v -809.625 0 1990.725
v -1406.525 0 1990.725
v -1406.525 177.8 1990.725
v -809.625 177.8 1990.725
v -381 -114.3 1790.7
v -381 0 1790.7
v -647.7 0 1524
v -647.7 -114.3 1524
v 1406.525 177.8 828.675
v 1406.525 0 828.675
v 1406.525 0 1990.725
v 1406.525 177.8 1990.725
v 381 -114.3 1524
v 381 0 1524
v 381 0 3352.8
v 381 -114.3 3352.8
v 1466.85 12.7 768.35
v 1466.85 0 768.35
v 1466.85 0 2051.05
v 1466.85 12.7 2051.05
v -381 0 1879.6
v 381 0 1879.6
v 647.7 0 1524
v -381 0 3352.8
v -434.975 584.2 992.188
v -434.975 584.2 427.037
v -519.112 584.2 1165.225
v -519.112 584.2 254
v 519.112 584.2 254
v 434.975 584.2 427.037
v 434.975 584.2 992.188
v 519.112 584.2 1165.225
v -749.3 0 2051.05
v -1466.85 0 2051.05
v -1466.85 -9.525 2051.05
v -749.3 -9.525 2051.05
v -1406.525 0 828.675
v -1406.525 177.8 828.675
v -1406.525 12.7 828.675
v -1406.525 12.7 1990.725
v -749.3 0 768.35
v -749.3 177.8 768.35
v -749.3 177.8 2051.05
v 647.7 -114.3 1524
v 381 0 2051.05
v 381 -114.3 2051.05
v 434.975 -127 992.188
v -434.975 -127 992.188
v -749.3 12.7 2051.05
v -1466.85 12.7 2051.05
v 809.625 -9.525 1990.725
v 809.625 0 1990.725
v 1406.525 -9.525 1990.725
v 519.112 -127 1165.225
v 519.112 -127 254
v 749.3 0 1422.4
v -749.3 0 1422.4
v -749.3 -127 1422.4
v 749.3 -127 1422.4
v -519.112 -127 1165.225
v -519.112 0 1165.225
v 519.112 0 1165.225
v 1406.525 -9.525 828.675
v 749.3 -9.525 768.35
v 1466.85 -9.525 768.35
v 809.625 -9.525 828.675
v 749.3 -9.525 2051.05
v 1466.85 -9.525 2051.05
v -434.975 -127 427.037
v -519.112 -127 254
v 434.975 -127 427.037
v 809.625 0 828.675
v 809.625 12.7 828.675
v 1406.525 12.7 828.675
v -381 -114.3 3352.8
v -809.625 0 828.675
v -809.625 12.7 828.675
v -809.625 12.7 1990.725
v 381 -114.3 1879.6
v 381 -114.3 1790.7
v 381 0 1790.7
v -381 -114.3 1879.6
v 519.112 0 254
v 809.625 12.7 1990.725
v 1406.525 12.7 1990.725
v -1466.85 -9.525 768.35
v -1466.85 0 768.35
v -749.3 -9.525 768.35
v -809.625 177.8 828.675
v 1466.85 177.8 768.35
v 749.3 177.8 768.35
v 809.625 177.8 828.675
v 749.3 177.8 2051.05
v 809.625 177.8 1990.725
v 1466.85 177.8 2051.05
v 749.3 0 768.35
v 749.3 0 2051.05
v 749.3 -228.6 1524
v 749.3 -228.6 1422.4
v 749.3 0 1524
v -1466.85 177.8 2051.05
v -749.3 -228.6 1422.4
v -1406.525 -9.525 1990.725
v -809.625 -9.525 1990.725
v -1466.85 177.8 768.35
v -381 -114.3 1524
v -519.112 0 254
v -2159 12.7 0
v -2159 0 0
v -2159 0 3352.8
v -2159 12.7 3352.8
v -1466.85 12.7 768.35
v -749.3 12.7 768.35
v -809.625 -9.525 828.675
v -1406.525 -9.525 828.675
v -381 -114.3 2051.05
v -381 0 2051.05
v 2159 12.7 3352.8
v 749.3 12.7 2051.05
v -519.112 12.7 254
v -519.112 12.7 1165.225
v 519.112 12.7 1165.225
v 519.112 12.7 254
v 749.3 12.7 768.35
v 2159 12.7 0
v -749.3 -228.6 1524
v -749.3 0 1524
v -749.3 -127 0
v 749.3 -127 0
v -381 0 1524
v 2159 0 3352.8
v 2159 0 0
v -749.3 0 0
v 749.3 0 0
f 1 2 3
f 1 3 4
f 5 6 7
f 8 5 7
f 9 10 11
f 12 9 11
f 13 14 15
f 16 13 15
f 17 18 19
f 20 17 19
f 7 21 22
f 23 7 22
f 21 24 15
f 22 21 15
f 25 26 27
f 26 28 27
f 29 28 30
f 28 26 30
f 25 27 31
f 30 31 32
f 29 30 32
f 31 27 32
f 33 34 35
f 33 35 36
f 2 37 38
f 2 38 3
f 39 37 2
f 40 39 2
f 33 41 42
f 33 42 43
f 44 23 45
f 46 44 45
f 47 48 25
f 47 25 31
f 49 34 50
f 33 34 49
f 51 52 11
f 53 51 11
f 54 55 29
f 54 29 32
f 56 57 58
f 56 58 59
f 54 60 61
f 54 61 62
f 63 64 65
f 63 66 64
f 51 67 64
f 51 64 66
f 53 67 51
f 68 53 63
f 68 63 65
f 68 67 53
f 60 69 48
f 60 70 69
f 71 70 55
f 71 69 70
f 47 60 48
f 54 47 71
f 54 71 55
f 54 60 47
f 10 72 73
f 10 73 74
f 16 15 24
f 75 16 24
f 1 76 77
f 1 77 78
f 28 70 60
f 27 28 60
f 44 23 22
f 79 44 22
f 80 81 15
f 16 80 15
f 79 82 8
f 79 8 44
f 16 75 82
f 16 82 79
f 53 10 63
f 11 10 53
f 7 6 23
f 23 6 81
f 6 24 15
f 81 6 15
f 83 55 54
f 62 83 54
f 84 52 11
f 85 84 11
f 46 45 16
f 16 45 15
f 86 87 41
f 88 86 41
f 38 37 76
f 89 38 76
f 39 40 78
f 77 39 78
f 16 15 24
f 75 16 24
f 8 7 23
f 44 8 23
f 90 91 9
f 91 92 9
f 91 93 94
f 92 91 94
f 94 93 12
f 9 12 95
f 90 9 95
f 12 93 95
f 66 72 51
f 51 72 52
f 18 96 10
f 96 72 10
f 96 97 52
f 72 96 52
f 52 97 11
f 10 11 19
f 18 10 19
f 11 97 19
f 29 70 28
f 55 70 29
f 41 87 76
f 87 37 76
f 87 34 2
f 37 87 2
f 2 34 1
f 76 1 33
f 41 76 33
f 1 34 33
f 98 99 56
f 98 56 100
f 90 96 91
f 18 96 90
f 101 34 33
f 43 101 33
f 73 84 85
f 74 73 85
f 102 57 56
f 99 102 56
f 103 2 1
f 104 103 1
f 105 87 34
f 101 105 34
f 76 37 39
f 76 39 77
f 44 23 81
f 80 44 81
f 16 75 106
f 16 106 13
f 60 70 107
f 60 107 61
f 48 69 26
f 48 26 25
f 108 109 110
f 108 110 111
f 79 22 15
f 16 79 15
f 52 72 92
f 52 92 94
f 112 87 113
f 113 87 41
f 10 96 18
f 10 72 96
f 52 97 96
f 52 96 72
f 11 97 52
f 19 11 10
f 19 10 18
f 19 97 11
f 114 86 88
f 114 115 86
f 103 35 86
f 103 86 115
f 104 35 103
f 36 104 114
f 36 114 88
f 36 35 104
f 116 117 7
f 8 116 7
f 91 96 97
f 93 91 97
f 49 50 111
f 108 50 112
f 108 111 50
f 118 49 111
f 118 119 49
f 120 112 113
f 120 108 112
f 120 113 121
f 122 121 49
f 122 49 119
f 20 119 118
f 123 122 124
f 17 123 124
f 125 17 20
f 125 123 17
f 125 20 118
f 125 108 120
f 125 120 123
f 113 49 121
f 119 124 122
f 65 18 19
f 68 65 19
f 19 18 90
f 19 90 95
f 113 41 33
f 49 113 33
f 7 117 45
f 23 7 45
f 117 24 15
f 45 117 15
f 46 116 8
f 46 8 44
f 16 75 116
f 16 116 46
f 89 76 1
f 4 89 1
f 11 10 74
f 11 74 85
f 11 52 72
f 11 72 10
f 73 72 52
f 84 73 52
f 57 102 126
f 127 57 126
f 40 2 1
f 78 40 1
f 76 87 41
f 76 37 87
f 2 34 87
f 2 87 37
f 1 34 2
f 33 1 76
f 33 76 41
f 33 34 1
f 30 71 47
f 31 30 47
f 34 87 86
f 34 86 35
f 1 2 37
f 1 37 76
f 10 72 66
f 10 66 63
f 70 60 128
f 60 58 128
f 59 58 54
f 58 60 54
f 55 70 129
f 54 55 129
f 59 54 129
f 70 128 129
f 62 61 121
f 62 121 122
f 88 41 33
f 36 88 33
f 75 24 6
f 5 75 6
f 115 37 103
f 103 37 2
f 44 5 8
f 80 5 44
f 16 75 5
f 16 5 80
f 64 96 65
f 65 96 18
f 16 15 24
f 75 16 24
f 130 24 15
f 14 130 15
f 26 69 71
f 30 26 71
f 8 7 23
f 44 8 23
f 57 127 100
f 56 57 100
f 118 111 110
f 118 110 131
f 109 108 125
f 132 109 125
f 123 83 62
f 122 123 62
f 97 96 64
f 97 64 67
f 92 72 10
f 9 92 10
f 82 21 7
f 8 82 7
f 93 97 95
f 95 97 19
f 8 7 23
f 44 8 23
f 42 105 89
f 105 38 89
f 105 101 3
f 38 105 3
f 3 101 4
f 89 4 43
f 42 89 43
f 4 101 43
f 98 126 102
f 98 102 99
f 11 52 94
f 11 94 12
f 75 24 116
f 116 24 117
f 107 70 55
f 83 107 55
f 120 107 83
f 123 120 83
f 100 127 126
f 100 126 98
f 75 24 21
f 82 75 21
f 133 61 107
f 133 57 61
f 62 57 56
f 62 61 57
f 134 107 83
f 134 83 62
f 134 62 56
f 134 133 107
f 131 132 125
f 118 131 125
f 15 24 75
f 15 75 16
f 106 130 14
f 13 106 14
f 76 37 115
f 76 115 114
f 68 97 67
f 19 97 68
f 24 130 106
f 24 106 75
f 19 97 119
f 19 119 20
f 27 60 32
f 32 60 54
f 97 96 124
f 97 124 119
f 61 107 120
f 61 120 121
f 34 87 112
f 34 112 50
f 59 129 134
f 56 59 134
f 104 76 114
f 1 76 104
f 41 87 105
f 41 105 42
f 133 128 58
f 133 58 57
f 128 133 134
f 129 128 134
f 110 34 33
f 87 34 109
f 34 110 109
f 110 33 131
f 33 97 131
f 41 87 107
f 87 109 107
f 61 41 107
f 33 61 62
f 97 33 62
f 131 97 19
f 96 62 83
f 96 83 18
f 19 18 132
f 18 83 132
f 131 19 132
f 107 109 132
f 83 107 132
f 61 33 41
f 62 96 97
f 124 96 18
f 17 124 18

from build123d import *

# Parameters (mm, degrees)
F1_W      = 1498.6
F1_H      = 127
F2_DEPTH  = 1422.4
F3_W      = 4318
F3_H      = 12.7
F4_DEPTH  = 3352.8
F5_W      = 1498.6
F5_H      = 101.6
F6_DEPTH  = 228.6
F11_W     = 717.55
F11_H     = 1282.7
F11_W_2   = 596.9
F11_H_2   = 1162.05
F12_DEPTH = 25.4
F8_W      = 762
F8_H      = 1828.8
F17_DEPTH = 114.3
F18_DEPTH = 114.3
F19_DEPTH = 114.3
F20_DEPTH = 114.3
F21_DEPTH = 177.8
F22_DEPTH = 9.525
F23_W     = 1038.225
F23_H     = 911.225
F23_W_2   = 869.95
F23_H_2   = 565.15
F24_DEPTH = 711.2
F25_DEPTH = 711.2


with BuildPart() as f2:
    # F1 (on Top) → F2 (new body)
    with BuildSketch(Plane.XY):
        with Locations((0, -63.5)):
            Rectangle(F1_W, F1_H)
    extrude(amount=F2_DEPTH)


with BuildPart() as f4:
    # F3 (on Top) → F4 (new body)
    with BuildSketch(Plane.XY):
        with Locations((0, 6.35)):
            Rectangle(F3_W, F3_H)
    extrude(amount=F4_DEPTH)

    # F11 (on face) → F12 (cut)
    with BuildSketch(Plane.XZ):
        with Locations((-1108.075, 1409.7)):
            Rectangle(F11_W, F11_H)
        with Locations((-1108.075, 1409.7)):
            Rectangle(F11_W_2, F11_H_2, mode=Mode.SUBTRACT)
        with Locations((1108.075, 1409.7)):
            Rectangle(F11_W, F11_H)
        with Locations((1108.075, 1409.7)):
            Rectangle(F11_W_2, F11_H_2, mode=Mode.SUBTRACT)
    extrude(amount=-F12_DEPTH, mode=Mode.SUBTRACT)


with BuildPart() as f6:
    # F5 (on face) → F6 (new body)
    with BuildSketch(Plane.XZ):
        with Locations((0, 1473.2)):
            Rectangle(F5_W, F5_H)
    extrude(amount=F6_DEPTH)


with BuildPart() as f17:
    # F8 (on face) → F17 (new body)
    with BuildSketch(Plane.XZ):
        with Locations((0, 2438.4)):
            Rectangle(F8_W, F8_H)
    extrude(amount=F17_DEPTH)


with BuildPart() as f18:
    # F14 (on face) → F18 (new body)
    with BuildSketch(Plane.XZ):
        Polygon((-381, 1790.7), (-647.7, 1524), (647.7, 1524), (381, 1790.7), (381, 3352.8), (-381, 3352.8), align=None)
    extrude(amount=F18_DEPTH)


with BuildPart() as f19:
    # F15 (on face) → F19 (new body)
    with BuildSketch(Plane.XZ):
        Polygon((-381, 1879.6), (-647.7, 1524), (647.7, 1524), (381, 1879.6), (381, 3352.8), (-381, 3352.8), align=None)
    extrude(amount=F19_DEPTH)


with BuildPart() as f20:
    # F16 (on face) → F20 (new body)
    with BuildSketch(Plane.XZ):
        Polygon((381, 3352.8), (-381, 3352.8), (-381, 2051.05), (-647.7, 1524), (647.7, 1524), (381, 2051.05), align=None)
    extrude(amount=F20_DEPTH)


with BuildPart() as f21:
    # F11 (on face) → F21 (new body)
    with BuildSketch(Plane.XZ):
        with Locations((-1108.075, 1409.7)):
            Rectangle(F11_W, F11_H)
        with Locations((-1108.075, 1409.7)):
            Rectangle(F11_W_2, F11_H_2, mode=Mode.SUBTRACT)
        with Locations((1108.075, 1409.7)):
            Rectangle(F11_W, F11_H)
        with Locations((1108.075, 1409.7)):
            Rectangle(F11_W_2, F11_H_2, mode=Mode.SUBTRACT)
    extrude(amount=-F21_DEPTH)


with BuildPart() as f22:
    # F11 (on face) → F22 (new body)
    with BuildSketch(Plane.XZ):
        with Locations((-1108.075, 1409.7)):
            Rectangle(F11_W, F11_H)
        with Locations((-1108.075, 1409.7)):
            Rectangle(F11_W_2, F11_H_2, mode=Mode.SUBTRACT)
        with Locations((1108.075, 1409.7)):
            Rectangle(F11_W, F11_H)
        with Locations((1108.075, 1409.7)):
            Rectangle(F11_W_2, F11_H_2, mode=Mode.SUBTRACT)
    extrude(amount=F22_DEPTH)


with BuildPart() as f24_tool:
    # F23 (on face) → F24 (new body)
    with BuildSketch(Plane.XZ.offset(127)):
        with Locations((0, 709.6125)):
            Rectangle(F23_W, F23_H)
        with Locations((0, 709.6125)):
            Rectangle(F23_W_2, F23_H_2, mode=Mode.SUBTRACT)
        with Locations((0, 709.6125)):
            Rectangle(F23_W_2, F23_H_2)
    extrude(amount=-F24_DEPTH)


with BuildPart() as f2_1:
    add(f2.part)

    # F24: cut by f24_tool
    add(f24_tool.part, mode=Mode.SUBTRACT)


with BuildPart() as f4_1:
    add(f4.part)

    # F24: cut by f24_tool
    add(f24_tool.part, mode=Mode.SUBTRACT)


with BuildPart() as f25:
    # F23 (on face) → F25 (new body)
    with BuildSketch(Plane.XZ.offset(127)):
        with Locations((0, 709.6125)):
            Rectangle(F23_W, F23_H)
        with Locations((0, 709.6125)):
            Rectangle(F23_W_2, F23_H_2, mode=Mode.SUBTRACT)
    extrude(amount=-F25_DEPTH)


solid = Compound([f6.part, f17.part, f18.part, f19.part, f20.part, f21.part, f22.part, f2_1.part, f4_1.part, f25.part])
